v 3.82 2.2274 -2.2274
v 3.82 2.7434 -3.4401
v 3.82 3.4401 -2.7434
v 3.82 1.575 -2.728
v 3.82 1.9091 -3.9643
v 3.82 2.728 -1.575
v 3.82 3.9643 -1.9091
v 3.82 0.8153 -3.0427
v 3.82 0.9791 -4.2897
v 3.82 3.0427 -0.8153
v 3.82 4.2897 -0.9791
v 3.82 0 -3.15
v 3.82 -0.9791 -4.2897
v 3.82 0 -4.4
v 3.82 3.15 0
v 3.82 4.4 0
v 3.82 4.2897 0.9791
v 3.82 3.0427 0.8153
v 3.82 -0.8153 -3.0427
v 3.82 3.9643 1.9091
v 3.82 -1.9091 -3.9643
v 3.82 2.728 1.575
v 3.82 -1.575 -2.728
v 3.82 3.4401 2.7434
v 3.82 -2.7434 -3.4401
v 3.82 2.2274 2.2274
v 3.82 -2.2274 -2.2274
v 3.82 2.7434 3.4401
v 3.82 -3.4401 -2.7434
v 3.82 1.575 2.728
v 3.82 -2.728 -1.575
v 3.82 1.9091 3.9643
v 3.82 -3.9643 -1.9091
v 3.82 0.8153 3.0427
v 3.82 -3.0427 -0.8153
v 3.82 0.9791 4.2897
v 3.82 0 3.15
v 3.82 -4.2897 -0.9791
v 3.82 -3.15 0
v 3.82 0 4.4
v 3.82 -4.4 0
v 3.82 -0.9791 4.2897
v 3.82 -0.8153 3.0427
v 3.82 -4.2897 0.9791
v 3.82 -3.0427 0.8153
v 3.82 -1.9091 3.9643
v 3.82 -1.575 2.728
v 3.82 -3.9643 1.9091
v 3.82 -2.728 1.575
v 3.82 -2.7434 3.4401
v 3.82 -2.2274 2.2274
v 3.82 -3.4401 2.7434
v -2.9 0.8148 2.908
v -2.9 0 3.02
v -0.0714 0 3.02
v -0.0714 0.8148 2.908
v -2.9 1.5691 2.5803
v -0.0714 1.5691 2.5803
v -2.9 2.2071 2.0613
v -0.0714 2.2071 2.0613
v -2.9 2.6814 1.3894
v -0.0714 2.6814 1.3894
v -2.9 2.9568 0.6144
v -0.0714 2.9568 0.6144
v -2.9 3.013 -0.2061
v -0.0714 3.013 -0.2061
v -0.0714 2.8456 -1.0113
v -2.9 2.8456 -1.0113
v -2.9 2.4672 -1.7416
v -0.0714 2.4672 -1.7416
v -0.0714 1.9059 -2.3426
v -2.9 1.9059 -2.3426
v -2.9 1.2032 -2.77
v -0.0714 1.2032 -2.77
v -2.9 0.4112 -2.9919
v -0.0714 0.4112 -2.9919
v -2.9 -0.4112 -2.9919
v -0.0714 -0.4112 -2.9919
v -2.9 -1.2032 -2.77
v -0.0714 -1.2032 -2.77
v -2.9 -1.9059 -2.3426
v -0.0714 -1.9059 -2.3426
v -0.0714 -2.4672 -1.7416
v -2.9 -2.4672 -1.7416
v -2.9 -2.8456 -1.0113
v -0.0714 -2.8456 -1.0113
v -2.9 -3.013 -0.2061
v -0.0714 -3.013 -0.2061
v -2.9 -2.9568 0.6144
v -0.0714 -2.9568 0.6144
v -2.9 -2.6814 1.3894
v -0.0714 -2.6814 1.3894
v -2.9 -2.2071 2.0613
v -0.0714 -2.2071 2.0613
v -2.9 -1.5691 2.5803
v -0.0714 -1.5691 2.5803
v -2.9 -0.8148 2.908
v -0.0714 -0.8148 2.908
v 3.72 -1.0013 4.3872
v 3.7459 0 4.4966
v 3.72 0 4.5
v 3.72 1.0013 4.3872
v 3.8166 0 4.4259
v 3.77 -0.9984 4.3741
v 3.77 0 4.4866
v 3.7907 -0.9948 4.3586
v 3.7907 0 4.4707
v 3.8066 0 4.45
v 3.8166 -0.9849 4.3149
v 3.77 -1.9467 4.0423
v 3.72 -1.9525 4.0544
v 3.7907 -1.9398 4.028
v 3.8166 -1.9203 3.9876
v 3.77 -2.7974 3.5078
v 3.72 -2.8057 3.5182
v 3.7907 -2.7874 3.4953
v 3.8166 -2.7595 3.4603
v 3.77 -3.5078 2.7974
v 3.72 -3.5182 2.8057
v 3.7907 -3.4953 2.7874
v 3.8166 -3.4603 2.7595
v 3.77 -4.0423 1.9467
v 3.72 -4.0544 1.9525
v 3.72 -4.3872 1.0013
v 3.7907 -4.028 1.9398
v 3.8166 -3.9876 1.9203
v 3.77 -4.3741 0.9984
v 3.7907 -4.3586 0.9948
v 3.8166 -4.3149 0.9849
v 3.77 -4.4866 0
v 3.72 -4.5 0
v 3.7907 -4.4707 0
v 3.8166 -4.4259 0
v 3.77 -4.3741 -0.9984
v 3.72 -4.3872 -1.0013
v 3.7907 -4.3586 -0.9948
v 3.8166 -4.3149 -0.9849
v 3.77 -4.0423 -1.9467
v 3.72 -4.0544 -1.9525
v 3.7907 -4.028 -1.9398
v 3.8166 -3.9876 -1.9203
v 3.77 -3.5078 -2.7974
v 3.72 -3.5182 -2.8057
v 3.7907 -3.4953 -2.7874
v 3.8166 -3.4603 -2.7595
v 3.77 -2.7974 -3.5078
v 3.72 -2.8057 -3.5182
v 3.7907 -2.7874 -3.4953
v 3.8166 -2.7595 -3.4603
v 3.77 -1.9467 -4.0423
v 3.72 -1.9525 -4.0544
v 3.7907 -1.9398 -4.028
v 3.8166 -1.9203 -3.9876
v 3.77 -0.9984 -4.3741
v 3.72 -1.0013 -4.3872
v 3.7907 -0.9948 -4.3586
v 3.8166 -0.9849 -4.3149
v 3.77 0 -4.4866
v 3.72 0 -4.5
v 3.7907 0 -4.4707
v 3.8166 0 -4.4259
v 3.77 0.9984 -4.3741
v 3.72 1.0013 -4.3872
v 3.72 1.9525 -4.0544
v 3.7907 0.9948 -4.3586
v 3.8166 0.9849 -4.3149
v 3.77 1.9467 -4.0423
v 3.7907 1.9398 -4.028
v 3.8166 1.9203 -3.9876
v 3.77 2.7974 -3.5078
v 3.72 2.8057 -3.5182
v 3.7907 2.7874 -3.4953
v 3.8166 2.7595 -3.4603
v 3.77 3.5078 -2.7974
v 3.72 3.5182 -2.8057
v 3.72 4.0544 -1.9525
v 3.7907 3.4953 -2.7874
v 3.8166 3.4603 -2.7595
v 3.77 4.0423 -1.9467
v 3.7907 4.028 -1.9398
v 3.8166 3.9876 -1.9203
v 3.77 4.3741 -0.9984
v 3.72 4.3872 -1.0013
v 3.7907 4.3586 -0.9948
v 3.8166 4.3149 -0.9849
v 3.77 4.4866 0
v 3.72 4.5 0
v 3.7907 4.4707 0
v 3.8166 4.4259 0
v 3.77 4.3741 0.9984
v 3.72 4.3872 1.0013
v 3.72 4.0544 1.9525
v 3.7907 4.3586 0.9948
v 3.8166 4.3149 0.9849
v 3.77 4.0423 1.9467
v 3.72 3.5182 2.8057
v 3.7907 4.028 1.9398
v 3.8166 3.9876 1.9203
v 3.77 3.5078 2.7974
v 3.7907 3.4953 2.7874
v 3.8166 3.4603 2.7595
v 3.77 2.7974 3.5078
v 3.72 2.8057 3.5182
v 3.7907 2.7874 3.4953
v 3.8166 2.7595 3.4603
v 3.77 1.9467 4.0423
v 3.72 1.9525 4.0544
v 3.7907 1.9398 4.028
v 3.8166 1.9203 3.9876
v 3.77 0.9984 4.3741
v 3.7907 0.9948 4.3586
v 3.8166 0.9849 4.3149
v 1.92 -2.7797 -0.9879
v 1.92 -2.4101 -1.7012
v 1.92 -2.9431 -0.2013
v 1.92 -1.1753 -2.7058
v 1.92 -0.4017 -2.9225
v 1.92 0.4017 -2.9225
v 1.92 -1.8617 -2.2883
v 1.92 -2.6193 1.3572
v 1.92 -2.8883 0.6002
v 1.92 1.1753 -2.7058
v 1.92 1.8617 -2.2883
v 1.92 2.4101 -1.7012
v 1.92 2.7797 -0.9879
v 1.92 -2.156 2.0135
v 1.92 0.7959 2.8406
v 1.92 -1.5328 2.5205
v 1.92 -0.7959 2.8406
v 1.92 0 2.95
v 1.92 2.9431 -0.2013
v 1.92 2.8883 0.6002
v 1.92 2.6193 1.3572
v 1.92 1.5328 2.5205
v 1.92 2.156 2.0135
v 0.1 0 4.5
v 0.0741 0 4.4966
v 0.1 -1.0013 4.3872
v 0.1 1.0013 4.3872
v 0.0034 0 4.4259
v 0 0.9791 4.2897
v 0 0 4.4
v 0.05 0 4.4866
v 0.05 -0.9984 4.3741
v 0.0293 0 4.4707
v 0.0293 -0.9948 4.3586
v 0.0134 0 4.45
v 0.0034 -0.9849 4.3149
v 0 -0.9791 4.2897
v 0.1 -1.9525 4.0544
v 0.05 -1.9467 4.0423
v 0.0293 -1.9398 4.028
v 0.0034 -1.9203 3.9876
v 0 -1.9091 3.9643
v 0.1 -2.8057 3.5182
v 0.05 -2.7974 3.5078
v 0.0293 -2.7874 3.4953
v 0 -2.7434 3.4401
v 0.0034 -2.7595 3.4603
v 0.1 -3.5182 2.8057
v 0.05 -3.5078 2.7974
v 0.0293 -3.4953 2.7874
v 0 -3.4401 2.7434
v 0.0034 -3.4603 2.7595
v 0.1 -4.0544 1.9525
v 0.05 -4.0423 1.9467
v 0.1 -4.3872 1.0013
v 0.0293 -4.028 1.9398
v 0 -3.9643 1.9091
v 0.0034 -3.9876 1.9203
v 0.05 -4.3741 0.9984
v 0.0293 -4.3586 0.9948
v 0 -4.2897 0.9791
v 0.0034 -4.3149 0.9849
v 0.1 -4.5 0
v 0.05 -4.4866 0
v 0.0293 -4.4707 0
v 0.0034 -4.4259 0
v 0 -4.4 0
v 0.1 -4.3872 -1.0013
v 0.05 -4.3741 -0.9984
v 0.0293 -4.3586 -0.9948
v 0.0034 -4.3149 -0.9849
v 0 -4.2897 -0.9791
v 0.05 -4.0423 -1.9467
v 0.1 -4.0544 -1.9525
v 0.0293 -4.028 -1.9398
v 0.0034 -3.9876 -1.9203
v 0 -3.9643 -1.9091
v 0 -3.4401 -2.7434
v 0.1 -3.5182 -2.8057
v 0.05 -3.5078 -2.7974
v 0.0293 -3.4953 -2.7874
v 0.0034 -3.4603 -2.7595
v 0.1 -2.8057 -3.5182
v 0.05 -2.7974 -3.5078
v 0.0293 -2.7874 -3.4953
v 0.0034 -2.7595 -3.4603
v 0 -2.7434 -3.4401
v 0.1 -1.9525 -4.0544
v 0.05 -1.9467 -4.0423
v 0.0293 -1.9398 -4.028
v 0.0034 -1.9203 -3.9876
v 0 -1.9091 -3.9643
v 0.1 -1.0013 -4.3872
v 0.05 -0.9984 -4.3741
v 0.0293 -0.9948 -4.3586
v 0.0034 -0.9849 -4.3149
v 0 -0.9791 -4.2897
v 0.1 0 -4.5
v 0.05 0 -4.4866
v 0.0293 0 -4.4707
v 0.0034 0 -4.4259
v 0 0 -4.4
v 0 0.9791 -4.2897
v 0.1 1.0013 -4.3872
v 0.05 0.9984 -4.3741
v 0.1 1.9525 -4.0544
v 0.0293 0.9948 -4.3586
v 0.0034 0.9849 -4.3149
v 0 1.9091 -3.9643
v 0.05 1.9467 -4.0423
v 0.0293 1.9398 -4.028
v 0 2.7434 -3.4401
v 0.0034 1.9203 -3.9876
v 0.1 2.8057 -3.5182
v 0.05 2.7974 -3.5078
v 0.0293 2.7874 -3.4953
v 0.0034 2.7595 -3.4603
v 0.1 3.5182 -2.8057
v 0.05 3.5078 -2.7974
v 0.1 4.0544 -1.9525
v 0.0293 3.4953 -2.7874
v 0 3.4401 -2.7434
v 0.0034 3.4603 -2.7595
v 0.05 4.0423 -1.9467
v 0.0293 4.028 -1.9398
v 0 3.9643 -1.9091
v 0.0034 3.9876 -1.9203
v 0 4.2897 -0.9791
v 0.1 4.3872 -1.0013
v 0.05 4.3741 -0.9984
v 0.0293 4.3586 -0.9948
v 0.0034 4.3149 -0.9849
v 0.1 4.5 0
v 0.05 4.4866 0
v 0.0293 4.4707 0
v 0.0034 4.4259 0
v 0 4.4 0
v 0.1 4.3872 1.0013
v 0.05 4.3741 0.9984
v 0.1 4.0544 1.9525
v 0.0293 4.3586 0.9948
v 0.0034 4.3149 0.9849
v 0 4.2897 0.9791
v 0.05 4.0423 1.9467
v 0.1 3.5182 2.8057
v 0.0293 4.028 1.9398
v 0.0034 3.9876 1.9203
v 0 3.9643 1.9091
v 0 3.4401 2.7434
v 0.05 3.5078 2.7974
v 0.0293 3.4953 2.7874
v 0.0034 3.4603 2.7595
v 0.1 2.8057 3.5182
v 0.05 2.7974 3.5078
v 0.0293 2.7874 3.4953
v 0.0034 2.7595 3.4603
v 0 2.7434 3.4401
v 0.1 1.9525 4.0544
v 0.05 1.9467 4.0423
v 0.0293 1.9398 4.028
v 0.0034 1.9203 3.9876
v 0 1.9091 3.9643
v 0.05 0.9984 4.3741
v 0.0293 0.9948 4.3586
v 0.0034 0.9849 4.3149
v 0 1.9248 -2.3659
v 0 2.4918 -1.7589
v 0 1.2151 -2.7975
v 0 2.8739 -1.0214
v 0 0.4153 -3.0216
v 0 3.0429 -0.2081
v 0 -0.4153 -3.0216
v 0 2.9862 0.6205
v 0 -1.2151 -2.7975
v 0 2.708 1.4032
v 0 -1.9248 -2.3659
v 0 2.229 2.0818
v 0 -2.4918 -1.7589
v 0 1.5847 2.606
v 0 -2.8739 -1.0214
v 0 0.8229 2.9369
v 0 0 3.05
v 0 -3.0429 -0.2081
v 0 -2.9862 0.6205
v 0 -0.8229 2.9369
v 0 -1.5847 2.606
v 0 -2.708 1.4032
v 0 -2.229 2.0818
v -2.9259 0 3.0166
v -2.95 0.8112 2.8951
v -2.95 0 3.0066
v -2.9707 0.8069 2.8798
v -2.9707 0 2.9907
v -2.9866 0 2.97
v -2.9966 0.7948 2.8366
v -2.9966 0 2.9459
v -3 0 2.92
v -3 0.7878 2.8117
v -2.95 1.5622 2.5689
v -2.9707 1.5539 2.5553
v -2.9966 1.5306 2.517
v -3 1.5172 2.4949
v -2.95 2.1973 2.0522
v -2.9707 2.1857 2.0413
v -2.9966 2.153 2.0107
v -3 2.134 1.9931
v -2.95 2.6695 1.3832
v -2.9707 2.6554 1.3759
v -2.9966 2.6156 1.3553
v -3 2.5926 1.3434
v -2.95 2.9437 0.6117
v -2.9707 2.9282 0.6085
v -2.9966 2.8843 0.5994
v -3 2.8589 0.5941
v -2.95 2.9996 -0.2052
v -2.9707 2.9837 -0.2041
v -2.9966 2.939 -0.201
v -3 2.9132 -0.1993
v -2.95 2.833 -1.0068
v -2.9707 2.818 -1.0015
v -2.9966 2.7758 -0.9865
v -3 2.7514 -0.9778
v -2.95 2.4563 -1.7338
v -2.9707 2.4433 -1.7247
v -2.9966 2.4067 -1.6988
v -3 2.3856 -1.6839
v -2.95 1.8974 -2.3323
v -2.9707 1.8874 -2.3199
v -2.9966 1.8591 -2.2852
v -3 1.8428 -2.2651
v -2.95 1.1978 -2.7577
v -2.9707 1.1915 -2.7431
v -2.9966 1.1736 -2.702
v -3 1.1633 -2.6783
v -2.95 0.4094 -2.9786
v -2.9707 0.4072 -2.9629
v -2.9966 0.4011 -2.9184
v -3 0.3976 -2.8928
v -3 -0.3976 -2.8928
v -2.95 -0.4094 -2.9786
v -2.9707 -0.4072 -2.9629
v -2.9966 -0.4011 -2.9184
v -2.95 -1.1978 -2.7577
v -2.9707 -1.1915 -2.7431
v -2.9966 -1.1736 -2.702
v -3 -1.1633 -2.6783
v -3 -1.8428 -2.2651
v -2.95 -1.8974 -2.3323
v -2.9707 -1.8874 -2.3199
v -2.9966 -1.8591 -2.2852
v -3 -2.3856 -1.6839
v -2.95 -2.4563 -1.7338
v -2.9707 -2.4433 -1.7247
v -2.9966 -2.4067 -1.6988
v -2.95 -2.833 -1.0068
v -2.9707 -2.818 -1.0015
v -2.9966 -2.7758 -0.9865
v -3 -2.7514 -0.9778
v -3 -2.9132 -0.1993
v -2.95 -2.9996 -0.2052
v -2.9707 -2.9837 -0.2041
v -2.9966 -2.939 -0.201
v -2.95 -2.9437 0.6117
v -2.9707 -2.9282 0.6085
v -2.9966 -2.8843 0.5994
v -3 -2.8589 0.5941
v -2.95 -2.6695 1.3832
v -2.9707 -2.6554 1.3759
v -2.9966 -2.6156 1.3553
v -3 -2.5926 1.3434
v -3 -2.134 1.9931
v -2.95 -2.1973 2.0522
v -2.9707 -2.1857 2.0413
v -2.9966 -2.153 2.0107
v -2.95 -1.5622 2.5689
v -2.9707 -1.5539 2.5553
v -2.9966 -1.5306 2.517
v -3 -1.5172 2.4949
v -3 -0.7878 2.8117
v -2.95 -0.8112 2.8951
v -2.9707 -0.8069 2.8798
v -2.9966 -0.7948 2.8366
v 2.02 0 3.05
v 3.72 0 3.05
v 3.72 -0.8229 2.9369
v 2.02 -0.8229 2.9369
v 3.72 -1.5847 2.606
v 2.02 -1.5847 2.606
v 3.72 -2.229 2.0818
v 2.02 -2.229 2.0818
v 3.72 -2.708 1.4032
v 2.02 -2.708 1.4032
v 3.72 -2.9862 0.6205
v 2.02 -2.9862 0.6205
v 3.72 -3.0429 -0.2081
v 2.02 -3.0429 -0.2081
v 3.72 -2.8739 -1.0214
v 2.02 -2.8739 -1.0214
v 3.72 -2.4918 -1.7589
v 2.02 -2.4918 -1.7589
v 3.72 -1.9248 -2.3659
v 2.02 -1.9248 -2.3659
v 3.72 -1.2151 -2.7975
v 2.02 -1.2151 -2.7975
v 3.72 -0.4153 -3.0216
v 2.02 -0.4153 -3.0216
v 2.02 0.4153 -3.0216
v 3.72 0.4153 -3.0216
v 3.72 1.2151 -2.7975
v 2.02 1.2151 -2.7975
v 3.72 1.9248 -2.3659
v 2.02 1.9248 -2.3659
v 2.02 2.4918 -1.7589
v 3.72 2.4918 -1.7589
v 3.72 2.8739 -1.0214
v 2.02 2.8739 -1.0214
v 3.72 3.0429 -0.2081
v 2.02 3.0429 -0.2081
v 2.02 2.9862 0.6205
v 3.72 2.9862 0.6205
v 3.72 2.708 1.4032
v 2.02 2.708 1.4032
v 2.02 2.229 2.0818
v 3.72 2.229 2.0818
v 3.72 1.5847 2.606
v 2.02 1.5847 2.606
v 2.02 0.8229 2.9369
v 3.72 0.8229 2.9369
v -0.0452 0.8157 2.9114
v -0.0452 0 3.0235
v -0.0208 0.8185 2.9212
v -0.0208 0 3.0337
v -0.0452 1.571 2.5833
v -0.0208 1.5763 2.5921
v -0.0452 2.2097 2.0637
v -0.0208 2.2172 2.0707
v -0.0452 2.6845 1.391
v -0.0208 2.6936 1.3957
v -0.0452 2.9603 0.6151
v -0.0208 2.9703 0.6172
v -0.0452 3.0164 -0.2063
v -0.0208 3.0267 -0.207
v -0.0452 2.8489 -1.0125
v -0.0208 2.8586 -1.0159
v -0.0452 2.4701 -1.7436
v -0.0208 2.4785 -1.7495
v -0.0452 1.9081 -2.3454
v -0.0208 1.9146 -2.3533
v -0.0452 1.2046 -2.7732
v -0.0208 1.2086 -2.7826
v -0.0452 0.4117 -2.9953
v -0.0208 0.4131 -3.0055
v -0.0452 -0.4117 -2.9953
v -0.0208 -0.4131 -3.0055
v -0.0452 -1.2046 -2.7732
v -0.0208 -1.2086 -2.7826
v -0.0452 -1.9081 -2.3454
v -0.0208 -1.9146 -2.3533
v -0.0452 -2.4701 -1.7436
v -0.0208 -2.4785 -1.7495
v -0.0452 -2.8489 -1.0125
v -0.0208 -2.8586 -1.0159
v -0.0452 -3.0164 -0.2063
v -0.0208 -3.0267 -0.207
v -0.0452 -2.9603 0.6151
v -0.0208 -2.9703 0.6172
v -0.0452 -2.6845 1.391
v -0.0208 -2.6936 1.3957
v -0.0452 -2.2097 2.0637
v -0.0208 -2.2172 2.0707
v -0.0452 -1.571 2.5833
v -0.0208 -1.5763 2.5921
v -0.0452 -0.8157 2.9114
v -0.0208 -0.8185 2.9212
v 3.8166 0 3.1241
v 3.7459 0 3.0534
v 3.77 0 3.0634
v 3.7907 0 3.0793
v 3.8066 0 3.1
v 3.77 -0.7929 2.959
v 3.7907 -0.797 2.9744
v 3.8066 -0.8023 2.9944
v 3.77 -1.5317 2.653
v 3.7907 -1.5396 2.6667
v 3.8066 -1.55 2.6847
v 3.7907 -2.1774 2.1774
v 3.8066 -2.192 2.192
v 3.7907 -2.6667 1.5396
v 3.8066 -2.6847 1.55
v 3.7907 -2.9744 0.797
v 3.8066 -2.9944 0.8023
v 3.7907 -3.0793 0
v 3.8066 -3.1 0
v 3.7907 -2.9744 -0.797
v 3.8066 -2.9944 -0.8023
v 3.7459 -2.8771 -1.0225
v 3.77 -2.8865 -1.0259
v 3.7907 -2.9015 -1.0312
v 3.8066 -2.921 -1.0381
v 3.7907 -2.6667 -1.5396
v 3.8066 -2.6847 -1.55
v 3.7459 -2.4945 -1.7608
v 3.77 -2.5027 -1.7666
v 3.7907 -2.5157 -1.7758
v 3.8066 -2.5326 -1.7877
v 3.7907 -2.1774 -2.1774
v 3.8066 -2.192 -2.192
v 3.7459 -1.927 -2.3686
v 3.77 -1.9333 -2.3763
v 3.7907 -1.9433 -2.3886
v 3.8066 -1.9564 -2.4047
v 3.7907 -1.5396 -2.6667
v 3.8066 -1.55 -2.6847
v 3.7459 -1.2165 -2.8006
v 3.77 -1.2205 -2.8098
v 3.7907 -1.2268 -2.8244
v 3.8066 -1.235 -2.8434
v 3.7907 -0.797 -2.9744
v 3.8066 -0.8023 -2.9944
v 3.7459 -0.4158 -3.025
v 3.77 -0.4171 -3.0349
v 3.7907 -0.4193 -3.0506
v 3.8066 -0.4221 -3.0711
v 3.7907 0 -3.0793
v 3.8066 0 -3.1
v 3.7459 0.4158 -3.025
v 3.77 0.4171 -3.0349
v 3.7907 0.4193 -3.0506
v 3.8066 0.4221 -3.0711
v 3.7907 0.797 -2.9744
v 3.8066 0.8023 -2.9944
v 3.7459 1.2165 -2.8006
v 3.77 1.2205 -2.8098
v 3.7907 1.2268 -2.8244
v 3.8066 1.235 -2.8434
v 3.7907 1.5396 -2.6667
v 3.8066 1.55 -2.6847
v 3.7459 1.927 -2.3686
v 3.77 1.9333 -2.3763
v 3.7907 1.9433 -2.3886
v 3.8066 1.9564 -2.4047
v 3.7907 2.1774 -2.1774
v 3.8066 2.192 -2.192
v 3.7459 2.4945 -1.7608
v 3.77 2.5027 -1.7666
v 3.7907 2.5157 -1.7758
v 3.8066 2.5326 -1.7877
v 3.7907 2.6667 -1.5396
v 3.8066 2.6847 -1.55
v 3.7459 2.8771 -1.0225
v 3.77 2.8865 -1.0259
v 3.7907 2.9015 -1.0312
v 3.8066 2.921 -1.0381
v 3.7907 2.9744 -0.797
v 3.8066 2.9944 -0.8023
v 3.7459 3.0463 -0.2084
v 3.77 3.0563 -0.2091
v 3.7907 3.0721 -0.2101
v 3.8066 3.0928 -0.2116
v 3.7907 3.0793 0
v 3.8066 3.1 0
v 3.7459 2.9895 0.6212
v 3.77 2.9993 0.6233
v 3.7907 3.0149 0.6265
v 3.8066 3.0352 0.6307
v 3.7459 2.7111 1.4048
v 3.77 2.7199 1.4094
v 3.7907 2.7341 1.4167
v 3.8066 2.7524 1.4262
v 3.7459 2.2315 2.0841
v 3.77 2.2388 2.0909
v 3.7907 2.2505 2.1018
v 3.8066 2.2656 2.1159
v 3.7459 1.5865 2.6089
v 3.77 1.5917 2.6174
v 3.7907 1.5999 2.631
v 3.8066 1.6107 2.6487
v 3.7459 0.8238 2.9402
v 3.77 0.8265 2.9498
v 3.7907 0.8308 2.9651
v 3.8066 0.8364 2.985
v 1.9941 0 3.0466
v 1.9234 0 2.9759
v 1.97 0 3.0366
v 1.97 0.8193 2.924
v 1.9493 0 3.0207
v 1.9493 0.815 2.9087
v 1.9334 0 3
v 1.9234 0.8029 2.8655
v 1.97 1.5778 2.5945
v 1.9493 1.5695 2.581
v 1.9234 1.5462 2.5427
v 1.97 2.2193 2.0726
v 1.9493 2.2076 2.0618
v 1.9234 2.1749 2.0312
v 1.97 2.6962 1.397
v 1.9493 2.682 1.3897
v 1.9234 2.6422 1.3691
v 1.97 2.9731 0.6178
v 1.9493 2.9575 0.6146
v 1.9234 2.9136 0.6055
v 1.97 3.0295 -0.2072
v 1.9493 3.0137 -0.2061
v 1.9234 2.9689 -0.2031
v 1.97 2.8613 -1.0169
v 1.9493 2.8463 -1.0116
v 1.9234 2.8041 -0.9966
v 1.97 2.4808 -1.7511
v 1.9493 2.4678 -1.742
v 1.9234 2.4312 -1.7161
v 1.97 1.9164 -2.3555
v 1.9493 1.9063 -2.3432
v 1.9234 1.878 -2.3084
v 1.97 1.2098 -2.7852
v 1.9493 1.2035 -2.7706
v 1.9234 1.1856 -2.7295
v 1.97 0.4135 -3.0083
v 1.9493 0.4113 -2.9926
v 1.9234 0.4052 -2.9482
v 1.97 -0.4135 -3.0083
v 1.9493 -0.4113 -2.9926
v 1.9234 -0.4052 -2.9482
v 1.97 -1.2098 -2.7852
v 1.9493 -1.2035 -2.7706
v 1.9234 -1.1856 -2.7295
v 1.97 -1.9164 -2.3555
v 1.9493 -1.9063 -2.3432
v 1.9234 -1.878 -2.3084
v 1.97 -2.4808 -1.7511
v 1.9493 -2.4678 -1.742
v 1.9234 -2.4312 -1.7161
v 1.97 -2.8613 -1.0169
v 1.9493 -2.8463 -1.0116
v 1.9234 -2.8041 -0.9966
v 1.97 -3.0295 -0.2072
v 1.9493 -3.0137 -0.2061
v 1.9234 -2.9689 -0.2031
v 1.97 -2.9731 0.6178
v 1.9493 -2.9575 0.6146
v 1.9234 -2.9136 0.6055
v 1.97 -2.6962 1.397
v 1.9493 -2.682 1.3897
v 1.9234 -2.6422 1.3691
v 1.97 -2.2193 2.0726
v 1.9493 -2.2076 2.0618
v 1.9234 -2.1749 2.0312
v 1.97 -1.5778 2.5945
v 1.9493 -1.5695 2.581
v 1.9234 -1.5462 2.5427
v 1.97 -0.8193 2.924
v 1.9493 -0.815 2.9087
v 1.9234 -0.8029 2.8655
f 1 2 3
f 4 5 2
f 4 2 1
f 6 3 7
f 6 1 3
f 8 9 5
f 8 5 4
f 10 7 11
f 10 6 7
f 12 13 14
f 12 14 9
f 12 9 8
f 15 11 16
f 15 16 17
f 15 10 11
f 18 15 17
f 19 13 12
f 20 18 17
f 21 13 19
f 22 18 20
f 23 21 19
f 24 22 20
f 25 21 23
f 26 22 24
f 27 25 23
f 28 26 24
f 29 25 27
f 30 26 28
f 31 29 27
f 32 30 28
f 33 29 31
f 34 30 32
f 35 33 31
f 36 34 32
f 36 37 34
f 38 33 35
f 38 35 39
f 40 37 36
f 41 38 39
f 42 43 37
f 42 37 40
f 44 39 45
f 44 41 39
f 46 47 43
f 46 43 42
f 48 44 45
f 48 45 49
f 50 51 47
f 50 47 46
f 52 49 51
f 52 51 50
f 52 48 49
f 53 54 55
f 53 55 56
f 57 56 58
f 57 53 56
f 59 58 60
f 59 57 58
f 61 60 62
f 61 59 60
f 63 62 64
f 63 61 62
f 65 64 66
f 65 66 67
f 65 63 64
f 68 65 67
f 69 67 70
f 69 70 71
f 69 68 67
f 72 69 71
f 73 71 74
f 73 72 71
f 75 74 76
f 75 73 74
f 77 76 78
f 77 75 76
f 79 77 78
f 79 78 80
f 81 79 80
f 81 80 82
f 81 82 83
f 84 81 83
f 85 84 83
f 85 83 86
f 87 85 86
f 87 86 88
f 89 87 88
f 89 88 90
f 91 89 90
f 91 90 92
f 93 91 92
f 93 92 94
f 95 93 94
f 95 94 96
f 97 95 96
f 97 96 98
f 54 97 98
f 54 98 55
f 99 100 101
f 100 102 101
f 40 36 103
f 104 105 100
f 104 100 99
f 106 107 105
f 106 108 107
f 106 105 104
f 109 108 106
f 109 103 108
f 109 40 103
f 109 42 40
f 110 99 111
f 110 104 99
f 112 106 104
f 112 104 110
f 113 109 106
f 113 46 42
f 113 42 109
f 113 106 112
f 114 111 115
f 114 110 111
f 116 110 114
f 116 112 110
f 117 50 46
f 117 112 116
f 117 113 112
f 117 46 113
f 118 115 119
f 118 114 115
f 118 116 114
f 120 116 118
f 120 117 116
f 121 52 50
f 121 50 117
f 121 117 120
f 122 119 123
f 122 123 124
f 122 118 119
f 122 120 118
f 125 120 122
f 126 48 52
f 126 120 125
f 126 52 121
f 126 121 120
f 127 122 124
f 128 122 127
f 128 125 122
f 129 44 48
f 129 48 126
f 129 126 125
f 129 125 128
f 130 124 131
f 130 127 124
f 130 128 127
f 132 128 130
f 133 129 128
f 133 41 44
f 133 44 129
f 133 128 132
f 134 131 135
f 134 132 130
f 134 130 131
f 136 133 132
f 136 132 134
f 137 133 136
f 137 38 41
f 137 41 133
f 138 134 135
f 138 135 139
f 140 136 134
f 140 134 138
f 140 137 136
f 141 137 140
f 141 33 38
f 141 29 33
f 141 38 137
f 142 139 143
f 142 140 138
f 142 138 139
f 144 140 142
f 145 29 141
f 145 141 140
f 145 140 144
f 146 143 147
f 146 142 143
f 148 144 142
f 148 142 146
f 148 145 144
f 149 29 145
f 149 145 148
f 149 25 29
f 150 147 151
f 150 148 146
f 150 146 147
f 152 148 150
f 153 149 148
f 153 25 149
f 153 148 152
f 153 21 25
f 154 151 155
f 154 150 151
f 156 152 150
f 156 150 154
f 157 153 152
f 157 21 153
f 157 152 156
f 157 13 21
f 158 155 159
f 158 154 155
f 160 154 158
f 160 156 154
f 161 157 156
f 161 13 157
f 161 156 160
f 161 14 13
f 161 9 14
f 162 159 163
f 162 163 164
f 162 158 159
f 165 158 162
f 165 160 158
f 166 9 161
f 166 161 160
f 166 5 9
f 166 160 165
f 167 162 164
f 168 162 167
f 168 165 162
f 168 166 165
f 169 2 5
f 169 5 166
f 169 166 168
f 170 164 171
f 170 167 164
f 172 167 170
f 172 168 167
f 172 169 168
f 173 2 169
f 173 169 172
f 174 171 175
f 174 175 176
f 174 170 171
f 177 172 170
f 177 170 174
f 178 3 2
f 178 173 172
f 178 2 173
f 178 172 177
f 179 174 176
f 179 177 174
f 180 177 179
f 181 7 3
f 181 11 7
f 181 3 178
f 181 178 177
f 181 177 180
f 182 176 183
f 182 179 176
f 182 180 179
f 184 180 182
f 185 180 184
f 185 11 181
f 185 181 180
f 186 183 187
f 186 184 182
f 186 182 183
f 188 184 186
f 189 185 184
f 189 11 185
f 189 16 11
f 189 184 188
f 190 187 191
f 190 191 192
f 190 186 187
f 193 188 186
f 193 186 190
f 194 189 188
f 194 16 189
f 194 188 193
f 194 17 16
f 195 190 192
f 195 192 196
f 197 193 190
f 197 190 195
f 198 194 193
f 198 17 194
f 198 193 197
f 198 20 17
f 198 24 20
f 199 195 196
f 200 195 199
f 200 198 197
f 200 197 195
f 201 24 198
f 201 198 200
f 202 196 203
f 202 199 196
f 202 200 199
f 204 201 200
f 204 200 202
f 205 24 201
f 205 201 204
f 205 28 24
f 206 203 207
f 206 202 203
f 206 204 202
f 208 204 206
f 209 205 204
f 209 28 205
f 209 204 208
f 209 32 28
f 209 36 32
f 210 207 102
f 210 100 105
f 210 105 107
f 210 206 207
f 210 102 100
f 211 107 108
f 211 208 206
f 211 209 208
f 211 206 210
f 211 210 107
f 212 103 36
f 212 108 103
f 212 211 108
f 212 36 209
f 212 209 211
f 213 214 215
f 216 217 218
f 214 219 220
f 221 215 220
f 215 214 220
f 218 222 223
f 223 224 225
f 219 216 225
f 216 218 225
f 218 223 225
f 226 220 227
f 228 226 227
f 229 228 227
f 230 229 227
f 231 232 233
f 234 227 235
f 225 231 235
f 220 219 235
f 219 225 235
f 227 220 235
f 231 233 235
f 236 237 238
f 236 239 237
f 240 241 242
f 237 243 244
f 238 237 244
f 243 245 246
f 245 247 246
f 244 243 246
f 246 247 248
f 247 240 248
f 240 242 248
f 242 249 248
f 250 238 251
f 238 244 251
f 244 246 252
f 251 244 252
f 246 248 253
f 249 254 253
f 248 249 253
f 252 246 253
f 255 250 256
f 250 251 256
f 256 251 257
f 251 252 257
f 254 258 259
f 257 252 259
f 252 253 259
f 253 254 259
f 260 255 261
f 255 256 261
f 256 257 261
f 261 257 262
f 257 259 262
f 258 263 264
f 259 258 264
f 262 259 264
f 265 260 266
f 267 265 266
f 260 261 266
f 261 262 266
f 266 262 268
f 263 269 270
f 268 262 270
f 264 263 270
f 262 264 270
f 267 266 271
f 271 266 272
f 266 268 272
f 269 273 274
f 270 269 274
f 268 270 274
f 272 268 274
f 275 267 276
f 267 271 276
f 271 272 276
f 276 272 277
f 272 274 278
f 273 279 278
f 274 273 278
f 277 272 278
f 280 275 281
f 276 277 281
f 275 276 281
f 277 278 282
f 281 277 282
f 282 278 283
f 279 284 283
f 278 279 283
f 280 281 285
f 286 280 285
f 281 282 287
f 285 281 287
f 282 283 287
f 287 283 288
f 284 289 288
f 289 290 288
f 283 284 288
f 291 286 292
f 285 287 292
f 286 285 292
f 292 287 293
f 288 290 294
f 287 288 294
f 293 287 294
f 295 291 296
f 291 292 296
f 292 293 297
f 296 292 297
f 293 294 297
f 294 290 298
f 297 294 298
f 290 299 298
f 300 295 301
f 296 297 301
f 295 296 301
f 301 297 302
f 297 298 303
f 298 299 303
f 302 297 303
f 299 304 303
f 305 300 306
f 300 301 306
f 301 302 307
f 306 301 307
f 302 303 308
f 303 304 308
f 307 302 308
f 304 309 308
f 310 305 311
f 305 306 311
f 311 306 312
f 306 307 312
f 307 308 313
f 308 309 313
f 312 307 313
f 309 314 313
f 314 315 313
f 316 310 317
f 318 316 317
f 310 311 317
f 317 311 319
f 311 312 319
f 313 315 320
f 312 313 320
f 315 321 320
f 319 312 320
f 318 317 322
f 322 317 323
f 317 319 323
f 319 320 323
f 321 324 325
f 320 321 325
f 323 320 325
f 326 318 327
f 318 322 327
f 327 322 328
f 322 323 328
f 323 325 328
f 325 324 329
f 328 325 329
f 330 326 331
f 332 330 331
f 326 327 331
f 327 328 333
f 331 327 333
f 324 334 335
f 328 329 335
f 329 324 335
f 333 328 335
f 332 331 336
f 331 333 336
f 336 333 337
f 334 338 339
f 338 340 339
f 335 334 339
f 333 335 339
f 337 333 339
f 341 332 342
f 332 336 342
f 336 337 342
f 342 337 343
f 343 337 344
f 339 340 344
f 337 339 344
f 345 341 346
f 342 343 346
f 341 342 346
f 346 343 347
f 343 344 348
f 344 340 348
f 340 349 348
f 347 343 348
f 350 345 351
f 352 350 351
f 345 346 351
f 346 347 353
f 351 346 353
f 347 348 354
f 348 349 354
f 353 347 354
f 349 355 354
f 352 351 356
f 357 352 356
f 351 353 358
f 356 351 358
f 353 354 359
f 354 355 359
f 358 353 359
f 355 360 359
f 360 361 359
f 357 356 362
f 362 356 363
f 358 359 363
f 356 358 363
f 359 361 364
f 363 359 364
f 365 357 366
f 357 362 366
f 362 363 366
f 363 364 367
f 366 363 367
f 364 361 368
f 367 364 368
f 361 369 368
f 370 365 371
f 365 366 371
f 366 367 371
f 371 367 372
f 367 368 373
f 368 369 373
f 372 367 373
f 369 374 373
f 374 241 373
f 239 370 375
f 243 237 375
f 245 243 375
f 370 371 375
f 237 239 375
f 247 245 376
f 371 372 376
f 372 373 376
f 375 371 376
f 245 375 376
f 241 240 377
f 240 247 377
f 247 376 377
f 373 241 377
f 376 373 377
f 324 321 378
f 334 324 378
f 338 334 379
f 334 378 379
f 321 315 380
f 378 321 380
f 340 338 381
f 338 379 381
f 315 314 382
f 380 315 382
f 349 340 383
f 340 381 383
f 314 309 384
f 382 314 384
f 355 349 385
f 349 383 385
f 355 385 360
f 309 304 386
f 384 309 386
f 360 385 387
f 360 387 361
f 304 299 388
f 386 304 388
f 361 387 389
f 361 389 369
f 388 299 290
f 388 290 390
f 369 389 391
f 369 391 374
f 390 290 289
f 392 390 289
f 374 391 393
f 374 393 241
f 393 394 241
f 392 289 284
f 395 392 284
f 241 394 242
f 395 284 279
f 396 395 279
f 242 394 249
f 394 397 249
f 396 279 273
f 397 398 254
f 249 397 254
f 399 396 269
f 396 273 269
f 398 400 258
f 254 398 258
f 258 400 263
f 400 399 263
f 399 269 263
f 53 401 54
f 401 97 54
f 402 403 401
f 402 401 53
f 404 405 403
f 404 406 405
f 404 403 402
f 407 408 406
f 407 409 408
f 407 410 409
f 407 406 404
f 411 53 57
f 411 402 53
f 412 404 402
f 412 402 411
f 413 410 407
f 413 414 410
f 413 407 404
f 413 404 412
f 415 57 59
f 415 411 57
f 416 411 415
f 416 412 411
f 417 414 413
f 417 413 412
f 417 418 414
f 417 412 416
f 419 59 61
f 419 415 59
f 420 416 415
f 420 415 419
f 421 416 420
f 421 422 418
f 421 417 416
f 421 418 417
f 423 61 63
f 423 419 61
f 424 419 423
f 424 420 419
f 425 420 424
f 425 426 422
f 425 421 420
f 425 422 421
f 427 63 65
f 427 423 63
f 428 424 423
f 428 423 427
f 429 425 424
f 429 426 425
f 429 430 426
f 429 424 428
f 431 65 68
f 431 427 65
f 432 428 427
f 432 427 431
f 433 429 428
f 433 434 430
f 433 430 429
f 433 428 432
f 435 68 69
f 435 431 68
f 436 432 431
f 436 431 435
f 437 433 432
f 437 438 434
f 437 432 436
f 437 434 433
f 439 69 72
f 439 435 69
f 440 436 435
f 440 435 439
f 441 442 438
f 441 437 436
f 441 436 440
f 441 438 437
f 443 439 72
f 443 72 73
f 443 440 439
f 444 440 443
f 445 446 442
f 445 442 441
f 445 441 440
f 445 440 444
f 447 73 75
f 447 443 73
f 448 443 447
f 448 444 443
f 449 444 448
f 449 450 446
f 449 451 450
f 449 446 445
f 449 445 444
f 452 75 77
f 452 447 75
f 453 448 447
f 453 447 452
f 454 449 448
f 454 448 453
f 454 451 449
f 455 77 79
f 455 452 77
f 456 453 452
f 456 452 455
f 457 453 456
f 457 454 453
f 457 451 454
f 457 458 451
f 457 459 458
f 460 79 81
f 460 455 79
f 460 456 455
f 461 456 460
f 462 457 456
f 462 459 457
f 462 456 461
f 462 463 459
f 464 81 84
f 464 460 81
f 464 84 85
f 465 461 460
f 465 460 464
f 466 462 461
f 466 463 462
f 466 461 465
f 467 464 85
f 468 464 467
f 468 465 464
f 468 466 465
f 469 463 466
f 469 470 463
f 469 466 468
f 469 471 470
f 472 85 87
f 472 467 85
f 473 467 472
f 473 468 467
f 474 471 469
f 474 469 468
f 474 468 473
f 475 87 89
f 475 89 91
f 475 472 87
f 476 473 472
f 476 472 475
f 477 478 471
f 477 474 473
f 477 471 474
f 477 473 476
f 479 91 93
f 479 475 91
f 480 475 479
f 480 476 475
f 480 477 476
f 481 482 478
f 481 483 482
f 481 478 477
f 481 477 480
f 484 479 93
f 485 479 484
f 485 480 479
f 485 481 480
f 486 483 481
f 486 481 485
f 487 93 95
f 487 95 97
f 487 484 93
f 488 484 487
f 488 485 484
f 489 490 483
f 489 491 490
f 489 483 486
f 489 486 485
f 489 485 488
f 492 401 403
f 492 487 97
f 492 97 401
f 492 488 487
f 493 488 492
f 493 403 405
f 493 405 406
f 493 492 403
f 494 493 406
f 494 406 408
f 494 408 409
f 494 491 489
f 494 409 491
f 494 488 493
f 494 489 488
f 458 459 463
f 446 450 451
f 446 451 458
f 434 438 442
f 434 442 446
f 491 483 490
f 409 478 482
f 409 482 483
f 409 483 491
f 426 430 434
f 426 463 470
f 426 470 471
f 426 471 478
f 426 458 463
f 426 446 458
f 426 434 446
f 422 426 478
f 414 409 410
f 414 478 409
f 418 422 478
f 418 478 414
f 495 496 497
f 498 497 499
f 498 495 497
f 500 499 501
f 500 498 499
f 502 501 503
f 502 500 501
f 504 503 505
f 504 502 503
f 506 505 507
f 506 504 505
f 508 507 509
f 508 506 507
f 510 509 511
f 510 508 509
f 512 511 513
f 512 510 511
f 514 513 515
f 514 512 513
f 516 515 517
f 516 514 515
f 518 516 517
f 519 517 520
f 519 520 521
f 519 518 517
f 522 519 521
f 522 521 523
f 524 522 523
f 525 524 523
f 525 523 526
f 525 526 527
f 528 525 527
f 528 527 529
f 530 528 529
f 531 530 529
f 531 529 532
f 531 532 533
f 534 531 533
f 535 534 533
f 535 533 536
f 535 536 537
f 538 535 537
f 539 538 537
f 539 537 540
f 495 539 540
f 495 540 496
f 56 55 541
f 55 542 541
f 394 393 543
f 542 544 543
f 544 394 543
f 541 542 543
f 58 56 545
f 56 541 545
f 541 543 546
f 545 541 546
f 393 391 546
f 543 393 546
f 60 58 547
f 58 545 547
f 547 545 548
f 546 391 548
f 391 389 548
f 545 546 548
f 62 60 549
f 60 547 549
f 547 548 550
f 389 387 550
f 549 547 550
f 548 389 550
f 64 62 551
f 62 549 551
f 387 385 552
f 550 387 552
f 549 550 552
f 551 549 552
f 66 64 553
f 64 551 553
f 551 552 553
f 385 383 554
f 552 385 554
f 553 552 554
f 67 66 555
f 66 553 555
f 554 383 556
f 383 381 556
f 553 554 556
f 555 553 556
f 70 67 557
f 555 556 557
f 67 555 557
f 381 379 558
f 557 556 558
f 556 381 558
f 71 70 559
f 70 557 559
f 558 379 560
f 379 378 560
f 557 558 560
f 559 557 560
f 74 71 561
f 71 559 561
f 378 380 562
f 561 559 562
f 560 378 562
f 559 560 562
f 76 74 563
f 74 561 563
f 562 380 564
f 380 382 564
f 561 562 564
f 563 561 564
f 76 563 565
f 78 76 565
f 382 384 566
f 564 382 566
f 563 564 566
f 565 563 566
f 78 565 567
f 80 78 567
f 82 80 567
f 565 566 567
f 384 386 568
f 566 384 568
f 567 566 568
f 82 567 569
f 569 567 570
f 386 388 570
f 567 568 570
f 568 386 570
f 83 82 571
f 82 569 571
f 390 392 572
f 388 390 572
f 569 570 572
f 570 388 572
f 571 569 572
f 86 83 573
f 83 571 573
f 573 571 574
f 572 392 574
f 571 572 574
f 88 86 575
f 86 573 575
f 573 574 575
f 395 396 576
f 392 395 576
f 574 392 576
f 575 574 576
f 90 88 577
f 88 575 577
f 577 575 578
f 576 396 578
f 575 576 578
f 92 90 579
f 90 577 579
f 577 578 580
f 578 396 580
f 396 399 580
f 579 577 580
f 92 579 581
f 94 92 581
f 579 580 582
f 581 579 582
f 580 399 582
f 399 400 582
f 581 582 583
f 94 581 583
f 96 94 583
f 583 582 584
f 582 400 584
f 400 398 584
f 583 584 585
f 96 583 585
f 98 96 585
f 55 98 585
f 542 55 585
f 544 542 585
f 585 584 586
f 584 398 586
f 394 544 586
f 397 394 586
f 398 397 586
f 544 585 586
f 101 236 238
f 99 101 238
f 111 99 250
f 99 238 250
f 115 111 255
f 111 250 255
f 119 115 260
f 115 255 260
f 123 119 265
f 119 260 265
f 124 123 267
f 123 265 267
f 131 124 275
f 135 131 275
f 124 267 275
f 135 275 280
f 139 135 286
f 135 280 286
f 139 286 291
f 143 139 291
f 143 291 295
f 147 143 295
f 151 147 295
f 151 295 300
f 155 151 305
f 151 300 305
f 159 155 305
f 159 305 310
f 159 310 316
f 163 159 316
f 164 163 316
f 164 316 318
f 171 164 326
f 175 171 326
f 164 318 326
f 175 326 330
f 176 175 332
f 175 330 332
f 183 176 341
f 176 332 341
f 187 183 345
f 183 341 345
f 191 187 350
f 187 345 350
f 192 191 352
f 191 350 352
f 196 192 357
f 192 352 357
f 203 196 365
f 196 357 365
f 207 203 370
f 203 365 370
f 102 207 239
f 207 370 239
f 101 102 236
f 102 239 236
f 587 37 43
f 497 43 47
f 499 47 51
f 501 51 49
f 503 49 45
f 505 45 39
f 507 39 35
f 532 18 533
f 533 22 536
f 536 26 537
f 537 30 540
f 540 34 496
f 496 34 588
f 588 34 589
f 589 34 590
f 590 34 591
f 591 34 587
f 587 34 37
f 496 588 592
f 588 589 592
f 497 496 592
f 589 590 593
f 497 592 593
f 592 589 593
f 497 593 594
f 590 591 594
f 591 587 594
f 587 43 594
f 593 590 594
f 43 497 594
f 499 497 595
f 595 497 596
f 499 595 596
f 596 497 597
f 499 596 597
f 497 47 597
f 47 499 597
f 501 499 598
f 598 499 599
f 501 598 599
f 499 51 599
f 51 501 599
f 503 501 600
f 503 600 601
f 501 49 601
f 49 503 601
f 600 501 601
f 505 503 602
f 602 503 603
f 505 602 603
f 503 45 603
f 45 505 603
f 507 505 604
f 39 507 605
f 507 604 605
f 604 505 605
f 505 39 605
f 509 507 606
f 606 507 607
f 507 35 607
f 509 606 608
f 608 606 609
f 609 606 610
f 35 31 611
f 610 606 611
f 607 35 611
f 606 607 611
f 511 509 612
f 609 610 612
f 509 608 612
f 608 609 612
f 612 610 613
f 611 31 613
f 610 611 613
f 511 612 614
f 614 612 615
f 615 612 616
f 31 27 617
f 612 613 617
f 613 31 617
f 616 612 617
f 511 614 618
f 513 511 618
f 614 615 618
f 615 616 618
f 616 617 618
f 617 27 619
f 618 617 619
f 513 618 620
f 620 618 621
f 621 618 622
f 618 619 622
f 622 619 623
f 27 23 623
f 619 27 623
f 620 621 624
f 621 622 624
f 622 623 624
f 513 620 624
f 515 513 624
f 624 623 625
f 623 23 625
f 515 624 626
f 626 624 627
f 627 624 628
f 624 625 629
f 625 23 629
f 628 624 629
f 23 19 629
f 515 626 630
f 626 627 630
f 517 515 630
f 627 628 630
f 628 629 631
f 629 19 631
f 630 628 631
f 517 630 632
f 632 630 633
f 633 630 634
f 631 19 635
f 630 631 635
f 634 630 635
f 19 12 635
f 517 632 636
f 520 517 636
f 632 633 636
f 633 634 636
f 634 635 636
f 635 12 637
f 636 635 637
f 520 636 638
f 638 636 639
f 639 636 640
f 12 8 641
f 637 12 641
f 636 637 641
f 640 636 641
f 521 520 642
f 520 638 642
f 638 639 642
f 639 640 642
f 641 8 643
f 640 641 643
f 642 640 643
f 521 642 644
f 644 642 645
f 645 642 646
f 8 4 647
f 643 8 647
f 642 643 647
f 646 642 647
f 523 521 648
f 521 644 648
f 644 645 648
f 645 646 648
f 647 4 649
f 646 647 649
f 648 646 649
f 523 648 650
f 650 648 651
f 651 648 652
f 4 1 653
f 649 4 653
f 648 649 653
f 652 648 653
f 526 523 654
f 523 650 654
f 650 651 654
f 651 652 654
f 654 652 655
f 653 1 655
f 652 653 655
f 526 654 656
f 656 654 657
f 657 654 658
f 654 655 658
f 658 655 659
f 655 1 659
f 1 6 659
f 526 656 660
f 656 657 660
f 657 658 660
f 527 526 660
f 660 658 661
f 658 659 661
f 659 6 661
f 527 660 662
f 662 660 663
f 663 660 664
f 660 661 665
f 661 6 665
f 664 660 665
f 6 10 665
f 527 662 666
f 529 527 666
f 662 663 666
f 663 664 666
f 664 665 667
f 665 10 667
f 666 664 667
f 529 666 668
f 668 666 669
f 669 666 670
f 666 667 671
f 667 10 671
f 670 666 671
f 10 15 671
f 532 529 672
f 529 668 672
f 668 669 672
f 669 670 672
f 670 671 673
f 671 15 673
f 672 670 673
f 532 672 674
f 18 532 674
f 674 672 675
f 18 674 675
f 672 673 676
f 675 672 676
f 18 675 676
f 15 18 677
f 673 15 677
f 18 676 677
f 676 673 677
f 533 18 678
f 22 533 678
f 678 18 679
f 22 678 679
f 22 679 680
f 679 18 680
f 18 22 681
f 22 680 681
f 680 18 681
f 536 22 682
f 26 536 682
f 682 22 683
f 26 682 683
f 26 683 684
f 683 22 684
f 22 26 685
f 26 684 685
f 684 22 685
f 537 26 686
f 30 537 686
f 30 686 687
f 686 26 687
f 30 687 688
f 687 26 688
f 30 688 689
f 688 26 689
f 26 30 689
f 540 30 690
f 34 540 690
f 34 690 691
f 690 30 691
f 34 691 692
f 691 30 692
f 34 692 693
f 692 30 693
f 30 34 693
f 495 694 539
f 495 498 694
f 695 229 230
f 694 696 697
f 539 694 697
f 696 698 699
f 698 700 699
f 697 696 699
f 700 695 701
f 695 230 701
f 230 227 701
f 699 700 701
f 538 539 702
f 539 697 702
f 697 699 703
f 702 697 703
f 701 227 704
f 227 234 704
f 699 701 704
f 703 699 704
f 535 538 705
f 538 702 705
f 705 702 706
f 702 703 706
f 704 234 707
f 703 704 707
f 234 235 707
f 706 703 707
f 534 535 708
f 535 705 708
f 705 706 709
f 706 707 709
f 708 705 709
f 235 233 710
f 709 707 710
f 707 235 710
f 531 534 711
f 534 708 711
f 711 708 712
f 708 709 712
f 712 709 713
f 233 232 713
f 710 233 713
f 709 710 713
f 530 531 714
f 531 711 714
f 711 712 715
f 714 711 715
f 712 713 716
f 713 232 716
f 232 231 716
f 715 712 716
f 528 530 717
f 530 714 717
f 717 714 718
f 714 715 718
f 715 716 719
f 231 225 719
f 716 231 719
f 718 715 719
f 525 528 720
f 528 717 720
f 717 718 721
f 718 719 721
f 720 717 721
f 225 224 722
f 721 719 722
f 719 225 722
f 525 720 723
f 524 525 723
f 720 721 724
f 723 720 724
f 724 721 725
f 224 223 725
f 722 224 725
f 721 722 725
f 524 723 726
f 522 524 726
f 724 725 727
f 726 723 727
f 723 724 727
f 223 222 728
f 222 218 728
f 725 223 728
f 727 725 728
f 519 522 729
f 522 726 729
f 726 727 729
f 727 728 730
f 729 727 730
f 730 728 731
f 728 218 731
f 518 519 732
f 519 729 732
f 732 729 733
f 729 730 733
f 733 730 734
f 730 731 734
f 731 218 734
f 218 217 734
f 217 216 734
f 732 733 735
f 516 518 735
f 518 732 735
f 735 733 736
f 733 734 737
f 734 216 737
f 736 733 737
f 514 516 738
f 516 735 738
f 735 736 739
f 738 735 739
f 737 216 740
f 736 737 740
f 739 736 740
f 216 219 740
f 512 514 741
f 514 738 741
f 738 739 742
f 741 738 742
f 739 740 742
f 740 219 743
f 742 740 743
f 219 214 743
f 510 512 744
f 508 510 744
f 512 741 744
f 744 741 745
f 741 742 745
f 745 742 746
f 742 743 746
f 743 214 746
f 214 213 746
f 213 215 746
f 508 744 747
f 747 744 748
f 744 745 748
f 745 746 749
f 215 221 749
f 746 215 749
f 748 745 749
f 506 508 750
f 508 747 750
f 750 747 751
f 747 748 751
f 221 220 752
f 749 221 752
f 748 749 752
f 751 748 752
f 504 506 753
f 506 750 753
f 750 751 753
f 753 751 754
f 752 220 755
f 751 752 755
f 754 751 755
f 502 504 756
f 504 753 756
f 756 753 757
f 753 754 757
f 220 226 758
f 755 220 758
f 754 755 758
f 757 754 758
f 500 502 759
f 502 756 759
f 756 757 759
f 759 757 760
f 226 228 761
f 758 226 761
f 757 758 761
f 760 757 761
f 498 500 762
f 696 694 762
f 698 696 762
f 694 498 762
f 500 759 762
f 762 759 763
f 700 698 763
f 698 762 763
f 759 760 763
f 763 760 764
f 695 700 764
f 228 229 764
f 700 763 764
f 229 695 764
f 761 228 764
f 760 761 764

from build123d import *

# Parameters (mm, degrees)
SKETCH_1_R           = 4.5
SKETCH_1_R_2         = 3.05
EXTRUDE_1_DEPTH      = 3.82
EXTRUDE_2_DEPTH      = 3
EXTRUDE_2_DEPTH_BACK = 1.92
SKETCH_2_R           = 3.05
SKETCH_3_R           = 3.05
SKETCH_3_R_2         = 3.02
CUT_EXTRUDE_1_DEPTH  = 3
FILLET_1_R           = 0.1
FILLET_2_R           = 0.1
FILLET_3_R           = 0.1
FILLET_4_R           = 0.1


with BuildPart() as part:
    # 草图1 → 凸台-拉伸1 (new body)
    with BuildSketch(Plane(origin=(0, 0, 0), x_dir=(0, 0, -1), z_dir=(1, 0, 0))):
        with Locations(Location((0, 0, 0), (0, 0, 180))):
            Circle(SKETCH_1_R)
        with Locations(Location((0, 0, 0), (0, 0, 180))):
            Circle(SKETCH_1_R_2, mode=Mode.SUBTRACT)
    extrude(amount=EXTRUDE_1_DEPTH)

    # 圆角1
    fillet_1_edges = [part.edges().sort_by_distance(p)[0] for p in [
        (0, 0, -4.5),
        (3.82, 0, -4.5),
        (3.82, 0, -3.05),
    ]]
    fillet(fillet_1_edges, radius=FILLET_1_R)


with BuildPart() as body_2:
    # 草图2 → 凸台-拉伸2 (new, two sides: drawn at the far end of the back side and taken through both)
    with BuildSketch(Plane.ZY.offset(-EXTRUDE_2_DEPTH_BACK)):
        Circle(SKETCH_2_R)
    extrude(amount=EXTRUDE_2_DEPTH + EXTRUDE_2_DEPTH_BACK)

    # 草图3 → 切除-拉伸1 (cut)
    with BuildSketch(Plane.ZY.offset(3)):
        with Locations(Location((0, 0, 0), (0, 0, 180))):
            Circle(SKETCH_3_R)
        Circle(SKETCH_3_R_2, mode=Mode.SUBTRACT)
    extrude(amount=-CUT_EXTRUDE_1_DEPTH, mode=Mode.SUBTRACT)

    # 圆角2
    fillet_2_edges = [body_2.edges().sort_by_distance(p)[0] for p in [
        (-3, 0, -3.02),
    ]]
    fillet(fillet_2_edges, radius=FILLET_2_R)

    # 圆角3
    # the kernel refuses this fillet: 0.1 mm, written as the material it adds along each edge
    with BuildSketch(Plane(origin=(0, 0, 0), x_dir=(0, 0, 1), z_dir=(0, -1, 0))) as fillet_3_piece_1:
        with BuildLine():
            CenterArc((3.12, 0.071414284), FILLET_3_R, 180, 45.572995999)
            Line((3.05, 0), (3.0486, -0.001428286))
            ThreePointArc((3.0486, -0.001428286), (3.035, -0.002), (3.02, -0.002))
            Line((3.02, -0.002), (3.018, 0))
            Line((3.018, 0), (3.018, 0.071414284))
            Line((3.018, 0.071414284), (3.02, 0.071414284))
        make_face()
    revolve(axis=Axis((0, 0, 0), (-1, 0, 0)))


with BuildPart() as part_1:
    add(part.part)

    # Combine 1: union body 2
    add(body_2.part)

    # 圆角4
    fillet_4_edges = [part_1.edges().sort_by_distance(p)[0] for p in [
        (1.92, 0, -3.05),
    ]]
    fillet(fillet_4_edges, radius=FILLET_4_R)


solid = part_1.part
